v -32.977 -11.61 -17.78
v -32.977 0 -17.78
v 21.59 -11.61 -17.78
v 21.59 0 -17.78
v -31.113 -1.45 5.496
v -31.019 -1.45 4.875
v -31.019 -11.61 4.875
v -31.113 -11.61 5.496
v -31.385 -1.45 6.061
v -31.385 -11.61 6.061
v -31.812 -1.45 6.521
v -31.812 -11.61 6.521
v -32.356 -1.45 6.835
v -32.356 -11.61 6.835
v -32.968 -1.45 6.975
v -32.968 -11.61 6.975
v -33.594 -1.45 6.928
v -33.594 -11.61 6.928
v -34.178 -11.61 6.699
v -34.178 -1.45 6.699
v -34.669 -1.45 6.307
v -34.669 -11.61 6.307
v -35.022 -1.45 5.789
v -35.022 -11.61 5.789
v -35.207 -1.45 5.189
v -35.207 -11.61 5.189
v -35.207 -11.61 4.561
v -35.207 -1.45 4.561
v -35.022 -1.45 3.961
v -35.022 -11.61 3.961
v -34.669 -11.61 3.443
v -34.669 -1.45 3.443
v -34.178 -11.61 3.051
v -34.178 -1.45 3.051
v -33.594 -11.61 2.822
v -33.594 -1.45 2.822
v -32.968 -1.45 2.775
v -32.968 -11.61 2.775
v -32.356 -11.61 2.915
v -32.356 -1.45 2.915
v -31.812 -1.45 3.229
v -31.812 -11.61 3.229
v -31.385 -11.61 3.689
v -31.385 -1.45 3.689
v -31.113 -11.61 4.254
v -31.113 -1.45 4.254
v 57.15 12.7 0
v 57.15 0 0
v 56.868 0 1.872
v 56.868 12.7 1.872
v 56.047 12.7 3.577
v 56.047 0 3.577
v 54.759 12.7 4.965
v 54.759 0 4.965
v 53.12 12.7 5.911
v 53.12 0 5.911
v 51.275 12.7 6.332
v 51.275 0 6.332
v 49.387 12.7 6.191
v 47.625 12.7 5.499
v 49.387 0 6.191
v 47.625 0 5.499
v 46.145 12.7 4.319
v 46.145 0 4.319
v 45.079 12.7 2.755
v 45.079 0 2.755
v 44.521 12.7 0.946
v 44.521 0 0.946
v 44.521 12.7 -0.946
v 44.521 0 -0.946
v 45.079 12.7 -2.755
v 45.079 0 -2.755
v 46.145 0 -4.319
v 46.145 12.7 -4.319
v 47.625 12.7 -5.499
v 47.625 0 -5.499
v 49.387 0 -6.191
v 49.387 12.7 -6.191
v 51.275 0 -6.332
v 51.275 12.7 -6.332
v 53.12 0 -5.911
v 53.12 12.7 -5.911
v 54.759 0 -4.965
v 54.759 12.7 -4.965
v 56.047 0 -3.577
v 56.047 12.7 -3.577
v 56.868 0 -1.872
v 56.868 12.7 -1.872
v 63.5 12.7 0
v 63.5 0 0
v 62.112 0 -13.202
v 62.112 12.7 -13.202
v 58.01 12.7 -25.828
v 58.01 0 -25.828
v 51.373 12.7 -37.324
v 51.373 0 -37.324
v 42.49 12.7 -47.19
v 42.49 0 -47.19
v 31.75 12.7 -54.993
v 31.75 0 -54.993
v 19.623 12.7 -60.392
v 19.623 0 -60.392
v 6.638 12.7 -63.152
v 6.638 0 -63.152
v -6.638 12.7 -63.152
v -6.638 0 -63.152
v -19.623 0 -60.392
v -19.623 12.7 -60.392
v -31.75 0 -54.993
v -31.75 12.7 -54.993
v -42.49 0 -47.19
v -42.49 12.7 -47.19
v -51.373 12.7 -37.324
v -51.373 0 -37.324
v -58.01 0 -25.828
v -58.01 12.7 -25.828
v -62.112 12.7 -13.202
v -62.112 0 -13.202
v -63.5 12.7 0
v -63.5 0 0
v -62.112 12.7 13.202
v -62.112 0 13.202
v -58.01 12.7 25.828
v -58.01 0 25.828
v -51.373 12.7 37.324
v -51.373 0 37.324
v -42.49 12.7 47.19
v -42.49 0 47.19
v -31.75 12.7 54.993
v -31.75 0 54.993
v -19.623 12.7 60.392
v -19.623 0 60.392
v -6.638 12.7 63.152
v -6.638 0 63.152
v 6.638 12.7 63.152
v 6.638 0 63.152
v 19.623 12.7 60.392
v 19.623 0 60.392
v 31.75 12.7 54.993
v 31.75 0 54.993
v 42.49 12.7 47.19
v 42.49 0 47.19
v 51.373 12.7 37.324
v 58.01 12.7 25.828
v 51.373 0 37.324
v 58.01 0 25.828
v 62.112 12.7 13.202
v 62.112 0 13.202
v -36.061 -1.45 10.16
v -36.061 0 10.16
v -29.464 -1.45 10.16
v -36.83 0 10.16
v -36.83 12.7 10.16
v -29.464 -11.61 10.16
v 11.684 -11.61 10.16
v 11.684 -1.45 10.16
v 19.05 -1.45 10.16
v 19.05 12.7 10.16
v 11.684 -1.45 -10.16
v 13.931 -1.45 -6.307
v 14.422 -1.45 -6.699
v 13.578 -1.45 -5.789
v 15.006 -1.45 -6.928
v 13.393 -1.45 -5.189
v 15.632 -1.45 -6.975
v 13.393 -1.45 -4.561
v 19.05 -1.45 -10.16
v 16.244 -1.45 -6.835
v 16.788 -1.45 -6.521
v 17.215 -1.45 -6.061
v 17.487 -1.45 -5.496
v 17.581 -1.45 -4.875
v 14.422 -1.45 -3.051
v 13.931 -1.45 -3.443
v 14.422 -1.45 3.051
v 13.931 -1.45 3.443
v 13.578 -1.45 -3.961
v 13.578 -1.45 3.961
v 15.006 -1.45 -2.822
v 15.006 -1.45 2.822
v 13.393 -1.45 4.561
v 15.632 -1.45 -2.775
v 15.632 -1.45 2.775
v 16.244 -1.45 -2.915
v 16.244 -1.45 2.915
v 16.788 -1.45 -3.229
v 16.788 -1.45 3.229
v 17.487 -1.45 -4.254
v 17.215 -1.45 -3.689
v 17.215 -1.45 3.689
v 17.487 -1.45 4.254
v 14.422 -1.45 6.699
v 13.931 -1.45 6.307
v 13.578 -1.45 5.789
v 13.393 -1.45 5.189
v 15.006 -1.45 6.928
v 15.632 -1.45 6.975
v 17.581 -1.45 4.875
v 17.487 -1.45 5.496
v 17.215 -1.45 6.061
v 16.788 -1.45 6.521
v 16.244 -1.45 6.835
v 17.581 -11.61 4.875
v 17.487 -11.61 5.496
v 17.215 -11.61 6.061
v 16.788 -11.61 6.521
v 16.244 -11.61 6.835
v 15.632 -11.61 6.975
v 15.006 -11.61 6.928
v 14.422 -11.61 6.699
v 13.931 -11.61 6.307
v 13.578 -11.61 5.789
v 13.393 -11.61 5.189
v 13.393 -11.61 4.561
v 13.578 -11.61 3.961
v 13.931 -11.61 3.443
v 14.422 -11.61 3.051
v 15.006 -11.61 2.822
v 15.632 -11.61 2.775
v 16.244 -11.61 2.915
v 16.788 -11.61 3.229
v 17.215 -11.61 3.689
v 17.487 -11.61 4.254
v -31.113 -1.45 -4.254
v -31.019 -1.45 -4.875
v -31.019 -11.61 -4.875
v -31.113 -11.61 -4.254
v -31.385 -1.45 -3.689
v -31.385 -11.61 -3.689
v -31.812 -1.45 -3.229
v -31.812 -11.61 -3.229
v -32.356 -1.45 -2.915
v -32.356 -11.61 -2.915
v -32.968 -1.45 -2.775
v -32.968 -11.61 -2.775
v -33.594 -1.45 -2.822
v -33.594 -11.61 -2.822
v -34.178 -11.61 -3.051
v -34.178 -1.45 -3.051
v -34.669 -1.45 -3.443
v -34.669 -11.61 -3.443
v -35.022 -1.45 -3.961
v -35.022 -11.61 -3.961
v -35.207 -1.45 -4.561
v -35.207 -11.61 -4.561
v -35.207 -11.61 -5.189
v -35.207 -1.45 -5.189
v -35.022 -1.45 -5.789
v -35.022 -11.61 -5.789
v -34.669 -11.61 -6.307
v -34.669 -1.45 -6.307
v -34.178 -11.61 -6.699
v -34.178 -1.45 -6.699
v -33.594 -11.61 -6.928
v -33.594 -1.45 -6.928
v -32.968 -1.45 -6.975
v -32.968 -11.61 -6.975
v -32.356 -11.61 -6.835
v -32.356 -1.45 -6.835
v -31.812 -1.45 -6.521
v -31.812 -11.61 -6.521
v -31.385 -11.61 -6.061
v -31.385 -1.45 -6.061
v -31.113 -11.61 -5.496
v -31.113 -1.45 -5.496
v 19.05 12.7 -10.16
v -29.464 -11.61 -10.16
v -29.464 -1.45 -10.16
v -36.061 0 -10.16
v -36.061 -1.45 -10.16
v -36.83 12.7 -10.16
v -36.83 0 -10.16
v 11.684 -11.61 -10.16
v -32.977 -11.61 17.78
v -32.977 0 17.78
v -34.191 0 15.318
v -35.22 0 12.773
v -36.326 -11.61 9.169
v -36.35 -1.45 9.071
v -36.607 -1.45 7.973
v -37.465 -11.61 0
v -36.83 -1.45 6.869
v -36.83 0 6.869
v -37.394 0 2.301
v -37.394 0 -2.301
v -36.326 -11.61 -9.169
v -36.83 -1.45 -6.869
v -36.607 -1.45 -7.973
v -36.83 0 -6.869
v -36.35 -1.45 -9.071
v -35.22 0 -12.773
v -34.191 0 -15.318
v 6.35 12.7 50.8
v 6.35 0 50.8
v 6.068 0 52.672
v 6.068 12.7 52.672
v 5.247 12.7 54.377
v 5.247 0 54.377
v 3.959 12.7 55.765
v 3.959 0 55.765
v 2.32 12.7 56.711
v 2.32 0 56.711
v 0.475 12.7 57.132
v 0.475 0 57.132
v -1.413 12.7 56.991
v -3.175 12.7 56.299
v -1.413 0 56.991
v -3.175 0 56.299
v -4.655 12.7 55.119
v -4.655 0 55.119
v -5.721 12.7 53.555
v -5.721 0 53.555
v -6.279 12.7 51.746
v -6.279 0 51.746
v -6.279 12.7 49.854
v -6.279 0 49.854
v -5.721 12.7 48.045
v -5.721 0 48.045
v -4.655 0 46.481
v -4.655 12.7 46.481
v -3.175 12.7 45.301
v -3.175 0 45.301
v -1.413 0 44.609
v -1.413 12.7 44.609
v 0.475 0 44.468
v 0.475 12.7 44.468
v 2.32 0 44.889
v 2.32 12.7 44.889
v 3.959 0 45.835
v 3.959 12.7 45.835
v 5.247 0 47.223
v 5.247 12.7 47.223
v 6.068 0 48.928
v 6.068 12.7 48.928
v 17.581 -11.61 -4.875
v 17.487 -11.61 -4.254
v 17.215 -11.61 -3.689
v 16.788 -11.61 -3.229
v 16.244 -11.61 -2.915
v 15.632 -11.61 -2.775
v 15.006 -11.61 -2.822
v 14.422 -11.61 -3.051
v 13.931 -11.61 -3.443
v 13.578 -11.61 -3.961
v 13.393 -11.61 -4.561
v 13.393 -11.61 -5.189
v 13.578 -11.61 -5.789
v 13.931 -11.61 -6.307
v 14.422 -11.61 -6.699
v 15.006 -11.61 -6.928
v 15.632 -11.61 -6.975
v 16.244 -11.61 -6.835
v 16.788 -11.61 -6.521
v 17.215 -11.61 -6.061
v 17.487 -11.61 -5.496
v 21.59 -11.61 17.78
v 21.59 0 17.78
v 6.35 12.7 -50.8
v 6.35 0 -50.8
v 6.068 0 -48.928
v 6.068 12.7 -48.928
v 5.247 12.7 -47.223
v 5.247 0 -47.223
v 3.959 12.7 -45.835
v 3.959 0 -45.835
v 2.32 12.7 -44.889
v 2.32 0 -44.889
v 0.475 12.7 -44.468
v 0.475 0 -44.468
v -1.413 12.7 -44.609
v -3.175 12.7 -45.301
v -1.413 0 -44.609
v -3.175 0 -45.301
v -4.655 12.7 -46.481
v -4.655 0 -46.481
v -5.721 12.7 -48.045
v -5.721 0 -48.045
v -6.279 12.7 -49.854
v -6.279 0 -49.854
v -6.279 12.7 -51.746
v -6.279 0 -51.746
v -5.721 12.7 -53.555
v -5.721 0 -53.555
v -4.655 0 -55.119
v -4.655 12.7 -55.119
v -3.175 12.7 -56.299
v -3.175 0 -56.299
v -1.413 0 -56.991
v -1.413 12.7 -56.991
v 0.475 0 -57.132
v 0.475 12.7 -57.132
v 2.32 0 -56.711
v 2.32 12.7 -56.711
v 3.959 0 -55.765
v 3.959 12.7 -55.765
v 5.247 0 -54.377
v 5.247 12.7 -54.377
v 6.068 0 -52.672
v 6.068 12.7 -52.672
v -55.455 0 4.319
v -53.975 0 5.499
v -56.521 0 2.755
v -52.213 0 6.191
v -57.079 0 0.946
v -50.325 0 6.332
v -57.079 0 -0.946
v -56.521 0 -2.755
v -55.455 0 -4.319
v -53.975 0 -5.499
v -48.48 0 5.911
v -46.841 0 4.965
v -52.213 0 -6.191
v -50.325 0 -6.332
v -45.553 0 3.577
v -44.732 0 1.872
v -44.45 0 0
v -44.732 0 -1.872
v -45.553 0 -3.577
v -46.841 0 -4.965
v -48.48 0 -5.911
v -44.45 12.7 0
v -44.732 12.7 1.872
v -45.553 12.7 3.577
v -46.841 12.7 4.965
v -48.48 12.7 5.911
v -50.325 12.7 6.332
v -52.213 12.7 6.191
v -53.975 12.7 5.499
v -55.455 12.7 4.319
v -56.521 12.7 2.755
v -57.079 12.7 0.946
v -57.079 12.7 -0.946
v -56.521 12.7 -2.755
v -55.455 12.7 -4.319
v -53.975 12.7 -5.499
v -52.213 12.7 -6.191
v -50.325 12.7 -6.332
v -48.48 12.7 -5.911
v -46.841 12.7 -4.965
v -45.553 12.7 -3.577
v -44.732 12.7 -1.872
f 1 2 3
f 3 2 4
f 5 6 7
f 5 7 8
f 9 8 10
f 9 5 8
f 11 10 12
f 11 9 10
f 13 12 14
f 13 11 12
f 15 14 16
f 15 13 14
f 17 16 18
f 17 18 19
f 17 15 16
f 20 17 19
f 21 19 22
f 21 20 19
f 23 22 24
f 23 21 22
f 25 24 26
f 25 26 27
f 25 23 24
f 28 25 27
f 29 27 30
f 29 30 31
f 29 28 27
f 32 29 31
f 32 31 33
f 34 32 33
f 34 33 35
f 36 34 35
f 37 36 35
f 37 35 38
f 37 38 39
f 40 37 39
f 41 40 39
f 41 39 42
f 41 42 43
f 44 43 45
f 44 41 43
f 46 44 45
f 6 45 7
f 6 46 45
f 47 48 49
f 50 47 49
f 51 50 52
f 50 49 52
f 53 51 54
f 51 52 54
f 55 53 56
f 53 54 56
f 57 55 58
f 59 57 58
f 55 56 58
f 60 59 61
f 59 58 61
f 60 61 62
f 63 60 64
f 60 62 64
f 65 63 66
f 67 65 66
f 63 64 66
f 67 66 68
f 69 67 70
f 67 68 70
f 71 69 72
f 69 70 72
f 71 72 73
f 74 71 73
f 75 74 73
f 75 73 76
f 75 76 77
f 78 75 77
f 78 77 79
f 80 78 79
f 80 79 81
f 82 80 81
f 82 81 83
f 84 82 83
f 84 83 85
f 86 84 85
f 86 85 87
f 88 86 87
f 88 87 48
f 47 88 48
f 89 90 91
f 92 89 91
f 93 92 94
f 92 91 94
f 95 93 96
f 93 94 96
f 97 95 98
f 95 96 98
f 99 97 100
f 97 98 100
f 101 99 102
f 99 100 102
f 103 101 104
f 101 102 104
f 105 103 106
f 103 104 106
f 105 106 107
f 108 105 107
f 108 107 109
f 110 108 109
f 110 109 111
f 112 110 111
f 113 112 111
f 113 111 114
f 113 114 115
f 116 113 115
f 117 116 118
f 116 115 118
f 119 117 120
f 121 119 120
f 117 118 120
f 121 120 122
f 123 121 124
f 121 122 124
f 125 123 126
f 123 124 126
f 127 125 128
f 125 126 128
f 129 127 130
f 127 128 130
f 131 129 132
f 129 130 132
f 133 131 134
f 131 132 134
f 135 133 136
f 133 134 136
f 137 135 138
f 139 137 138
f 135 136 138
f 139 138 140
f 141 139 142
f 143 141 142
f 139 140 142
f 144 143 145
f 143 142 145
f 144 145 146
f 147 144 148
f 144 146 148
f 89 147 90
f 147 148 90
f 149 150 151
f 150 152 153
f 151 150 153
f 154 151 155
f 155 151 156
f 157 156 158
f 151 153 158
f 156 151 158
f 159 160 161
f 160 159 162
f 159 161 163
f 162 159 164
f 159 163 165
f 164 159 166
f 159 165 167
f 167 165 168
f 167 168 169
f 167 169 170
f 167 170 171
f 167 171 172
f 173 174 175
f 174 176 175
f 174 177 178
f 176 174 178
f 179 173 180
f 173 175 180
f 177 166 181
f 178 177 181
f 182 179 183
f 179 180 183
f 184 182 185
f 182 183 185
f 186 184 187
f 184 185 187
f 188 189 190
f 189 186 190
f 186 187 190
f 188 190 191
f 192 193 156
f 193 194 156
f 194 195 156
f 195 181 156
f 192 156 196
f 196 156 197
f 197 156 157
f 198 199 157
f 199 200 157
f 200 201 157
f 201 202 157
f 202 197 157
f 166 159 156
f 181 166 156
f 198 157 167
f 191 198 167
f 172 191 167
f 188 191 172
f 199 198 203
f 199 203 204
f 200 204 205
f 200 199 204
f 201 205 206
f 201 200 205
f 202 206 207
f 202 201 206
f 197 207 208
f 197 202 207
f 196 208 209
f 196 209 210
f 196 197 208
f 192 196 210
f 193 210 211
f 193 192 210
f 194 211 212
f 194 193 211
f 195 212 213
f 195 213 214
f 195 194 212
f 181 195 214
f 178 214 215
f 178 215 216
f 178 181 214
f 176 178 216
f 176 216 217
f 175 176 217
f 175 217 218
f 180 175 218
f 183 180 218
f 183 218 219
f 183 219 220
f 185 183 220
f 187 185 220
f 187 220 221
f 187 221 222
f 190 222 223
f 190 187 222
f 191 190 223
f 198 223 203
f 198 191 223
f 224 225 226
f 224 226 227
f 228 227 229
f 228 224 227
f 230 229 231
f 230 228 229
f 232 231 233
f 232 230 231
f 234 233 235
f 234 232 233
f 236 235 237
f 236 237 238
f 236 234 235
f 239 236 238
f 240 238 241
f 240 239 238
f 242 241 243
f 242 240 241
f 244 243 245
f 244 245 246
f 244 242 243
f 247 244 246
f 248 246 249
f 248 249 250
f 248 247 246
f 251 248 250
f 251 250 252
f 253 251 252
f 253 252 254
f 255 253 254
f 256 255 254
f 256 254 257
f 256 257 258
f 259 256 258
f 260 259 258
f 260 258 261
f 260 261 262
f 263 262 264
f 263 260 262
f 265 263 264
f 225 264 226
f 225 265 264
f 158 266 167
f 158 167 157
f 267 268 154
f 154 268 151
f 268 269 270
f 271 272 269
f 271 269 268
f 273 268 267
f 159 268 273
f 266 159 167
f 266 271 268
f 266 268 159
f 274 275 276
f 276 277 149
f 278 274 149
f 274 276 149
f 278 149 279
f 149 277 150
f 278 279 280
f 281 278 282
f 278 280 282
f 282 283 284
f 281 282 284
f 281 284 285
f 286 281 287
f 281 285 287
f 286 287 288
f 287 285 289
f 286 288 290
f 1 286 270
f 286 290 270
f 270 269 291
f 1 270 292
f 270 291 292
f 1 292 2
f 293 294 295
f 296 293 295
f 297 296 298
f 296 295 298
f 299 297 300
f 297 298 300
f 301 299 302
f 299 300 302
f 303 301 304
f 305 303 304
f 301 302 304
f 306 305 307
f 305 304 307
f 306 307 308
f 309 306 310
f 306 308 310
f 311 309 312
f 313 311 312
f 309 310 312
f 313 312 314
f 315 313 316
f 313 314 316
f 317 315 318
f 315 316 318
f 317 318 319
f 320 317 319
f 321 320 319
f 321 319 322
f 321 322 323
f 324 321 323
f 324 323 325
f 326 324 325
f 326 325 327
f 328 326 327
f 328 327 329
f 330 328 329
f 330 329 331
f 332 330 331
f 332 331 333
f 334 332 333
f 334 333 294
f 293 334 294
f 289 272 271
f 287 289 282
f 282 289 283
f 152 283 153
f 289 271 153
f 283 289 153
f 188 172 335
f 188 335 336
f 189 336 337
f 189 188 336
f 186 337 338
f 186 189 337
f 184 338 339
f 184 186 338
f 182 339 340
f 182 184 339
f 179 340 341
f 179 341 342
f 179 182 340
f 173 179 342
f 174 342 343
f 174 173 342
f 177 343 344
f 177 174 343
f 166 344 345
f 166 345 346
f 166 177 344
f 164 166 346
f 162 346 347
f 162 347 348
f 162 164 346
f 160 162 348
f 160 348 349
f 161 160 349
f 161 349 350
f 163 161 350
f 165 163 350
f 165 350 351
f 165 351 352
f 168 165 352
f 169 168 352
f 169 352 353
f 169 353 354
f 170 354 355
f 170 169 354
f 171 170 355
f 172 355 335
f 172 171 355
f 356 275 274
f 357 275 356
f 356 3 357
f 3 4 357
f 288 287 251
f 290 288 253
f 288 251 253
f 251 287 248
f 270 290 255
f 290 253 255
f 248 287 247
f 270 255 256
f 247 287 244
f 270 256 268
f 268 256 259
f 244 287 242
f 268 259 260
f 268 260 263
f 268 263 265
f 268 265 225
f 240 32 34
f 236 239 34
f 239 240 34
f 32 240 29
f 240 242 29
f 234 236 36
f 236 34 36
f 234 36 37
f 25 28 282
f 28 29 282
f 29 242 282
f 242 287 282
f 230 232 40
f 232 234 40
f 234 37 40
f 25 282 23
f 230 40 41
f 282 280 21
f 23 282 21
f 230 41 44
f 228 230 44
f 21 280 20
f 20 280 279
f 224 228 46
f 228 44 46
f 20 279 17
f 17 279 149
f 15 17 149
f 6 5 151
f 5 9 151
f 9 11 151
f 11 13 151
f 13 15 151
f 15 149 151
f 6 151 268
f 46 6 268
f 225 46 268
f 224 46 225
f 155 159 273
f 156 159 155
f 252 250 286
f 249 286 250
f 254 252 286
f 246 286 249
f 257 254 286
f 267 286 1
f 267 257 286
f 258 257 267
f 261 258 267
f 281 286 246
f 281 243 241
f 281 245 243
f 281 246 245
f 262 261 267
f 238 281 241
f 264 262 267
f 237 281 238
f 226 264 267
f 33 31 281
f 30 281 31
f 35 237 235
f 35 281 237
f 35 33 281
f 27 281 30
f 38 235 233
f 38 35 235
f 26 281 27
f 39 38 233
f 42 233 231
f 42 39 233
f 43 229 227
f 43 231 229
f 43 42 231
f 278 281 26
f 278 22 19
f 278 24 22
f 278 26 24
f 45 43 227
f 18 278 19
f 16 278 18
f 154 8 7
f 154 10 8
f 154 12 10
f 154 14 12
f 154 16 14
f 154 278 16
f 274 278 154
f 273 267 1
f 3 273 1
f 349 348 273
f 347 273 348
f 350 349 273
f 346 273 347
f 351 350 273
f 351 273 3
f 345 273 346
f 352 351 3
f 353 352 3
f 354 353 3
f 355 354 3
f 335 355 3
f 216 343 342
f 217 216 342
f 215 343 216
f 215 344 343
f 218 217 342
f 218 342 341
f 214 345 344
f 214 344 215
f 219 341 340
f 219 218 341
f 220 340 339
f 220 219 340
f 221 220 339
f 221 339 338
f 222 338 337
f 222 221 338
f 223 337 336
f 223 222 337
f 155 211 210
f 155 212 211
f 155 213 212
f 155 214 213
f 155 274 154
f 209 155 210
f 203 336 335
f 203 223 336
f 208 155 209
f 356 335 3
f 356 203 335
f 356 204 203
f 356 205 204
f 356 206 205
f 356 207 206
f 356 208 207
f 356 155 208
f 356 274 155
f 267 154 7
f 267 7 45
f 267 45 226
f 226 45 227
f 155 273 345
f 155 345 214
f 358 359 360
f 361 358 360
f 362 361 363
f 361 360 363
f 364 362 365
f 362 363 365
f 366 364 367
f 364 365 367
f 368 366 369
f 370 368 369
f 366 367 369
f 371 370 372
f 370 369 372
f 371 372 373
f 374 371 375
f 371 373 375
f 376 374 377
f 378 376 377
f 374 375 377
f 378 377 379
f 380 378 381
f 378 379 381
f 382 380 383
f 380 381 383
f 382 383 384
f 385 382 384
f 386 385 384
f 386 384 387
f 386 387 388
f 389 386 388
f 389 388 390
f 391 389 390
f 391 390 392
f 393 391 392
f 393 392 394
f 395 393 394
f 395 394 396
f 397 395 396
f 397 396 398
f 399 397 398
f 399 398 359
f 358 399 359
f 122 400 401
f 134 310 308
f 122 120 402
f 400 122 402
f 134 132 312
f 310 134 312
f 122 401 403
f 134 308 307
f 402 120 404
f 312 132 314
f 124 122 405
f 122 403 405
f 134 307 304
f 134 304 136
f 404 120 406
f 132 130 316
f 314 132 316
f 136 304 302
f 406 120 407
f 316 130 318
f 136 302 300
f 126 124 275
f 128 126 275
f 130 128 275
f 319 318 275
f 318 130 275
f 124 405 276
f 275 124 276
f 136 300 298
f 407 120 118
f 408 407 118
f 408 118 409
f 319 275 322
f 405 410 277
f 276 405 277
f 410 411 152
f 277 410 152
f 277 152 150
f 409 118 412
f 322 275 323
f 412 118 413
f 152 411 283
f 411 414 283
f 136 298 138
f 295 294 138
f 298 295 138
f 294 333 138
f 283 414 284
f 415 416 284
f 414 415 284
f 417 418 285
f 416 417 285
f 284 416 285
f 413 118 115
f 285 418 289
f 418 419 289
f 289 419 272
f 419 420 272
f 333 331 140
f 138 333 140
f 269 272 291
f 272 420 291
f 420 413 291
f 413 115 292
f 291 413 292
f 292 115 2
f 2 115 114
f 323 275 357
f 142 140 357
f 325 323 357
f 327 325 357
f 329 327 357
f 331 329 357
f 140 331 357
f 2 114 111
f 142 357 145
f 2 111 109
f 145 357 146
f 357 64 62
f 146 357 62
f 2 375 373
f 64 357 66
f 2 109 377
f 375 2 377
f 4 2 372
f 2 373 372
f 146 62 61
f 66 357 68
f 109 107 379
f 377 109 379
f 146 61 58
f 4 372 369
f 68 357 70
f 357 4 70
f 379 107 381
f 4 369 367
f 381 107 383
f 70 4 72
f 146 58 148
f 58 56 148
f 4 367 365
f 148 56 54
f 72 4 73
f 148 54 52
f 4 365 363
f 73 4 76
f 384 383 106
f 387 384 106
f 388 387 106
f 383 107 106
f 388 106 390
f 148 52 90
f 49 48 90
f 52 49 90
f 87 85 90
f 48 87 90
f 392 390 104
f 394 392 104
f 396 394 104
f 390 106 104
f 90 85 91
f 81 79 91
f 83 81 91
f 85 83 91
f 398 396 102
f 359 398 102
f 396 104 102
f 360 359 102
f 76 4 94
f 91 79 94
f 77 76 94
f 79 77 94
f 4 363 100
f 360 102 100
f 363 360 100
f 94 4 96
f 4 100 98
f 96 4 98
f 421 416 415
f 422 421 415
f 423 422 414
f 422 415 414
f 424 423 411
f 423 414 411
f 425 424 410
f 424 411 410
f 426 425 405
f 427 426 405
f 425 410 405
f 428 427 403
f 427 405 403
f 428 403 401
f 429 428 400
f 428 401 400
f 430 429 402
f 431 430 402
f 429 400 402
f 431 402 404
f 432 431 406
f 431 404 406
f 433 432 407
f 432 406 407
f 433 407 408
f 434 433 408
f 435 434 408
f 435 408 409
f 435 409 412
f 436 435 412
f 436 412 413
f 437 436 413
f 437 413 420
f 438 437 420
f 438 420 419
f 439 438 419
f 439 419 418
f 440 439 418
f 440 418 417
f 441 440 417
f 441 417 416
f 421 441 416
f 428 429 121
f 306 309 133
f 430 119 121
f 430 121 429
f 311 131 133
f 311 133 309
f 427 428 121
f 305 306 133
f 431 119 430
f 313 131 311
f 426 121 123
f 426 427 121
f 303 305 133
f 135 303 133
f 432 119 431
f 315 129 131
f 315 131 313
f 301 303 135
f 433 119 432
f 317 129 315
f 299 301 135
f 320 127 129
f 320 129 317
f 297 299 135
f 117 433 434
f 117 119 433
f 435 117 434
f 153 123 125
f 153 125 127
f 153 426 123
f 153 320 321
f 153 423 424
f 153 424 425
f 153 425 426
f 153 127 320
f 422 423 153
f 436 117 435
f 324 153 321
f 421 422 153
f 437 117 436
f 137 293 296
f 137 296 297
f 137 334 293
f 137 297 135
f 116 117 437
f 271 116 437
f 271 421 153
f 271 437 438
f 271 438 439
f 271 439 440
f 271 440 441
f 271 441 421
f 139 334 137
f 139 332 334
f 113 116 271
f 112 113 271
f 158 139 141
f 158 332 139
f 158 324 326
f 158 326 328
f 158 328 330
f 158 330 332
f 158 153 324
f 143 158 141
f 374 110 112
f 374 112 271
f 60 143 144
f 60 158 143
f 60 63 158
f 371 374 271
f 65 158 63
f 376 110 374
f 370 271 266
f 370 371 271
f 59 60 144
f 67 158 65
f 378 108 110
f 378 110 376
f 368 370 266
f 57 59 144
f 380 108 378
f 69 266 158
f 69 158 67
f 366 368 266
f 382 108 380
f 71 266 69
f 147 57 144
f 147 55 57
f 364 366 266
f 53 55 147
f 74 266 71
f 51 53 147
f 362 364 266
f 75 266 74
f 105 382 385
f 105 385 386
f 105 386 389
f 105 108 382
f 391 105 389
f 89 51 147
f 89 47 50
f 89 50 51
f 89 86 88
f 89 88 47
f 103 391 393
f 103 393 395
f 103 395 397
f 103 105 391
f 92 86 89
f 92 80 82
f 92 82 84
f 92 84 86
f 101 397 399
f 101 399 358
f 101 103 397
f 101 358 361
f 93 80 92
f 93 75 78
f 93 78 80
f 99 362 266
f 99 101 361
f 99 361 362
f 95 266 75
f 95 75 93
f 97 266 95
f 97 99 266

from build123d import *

# Parameters (mm, degrees)
SKETCH2_R           = 63.5
BOSS_EXTRUDE1_DEPTH = 12.7
SKETCH3_R           = 6.35
CUT_EXTRUDE1_DEPTH  = 13.7
SKETCH6_W           = 55.88
SKETCH6_H           = 20.32
CUT_EXTRUDE3_DEPTH  = 27.686
SKETCH8_W           = 60.96
SKETCH8_H           = 35.56
SKETCH8_W_2         = 55.88
SKETCH8_H_2         = 20.32
BOSS_EXTRUDE2_DEPTH = 1.45
SKETCH9_W           = 60.96
SKETCH9_H           = 35.56
SKETCH9_R           = 2.105780523
SKETCH9_W_2         = 41.148
SKETCH9_H_2         = 20.32
BOSS_EXTRUDE3_DEPTH = 10.16
SKETCH11_R          = 63.5
SKETCH11_R_2        = 37.465
CUT_EXTRUDE5_DEPTH  = 12.61


with BuildPart() as part:
    # Sketch2 → Boss-Extrude1 (new body)
    with BuildSketch(Plane(origin=(0, 0, 0), x_dir=(1, 0, 0), z_dir=(0, 1, 0))):
        Circle(SKETCH2_R)
    extrude(amount=BOSS_EXTRUDE1_DEPTH)

    # Sketch3 → Cut-Extrude1 (cut, through all)
    with BuildSketch(Plane.XZ):
        with Locations((0, 50.8)):
            Circle(SKETCH3_R)
        with Locations((-50.8, 0)):
            Circle(SKETCH3_R)
        with Locations((0, -50.8)):
            Circle(SKETCH3_R)
        with Locations((50.8, 0)):
            Circle(SKETCH3_R)
    extrude(amount=-CUT_EXTRUDE1_DEPTH, mode=Mode.SUBTRACT)

    # Sketch6 → Cut-Extrude3 (cut)
    with BuildSketch(Plane.XZ):
        with Locations((-8.89, 0)):
            Rectangle(SKETCH6_W, SKETCH6_H)
    extrude(amount=-CUT_EXTRUDE3_DEPTH, mode=Mode.SUBTRACT)

    # Sketch8 → Boss-Extrude2 (add)
    with BuildSketch(Plane.XZ):
        with Locations((-8.89, 0)):
            Rectangle(SKETCH8_W, SKETCH8_H)
        with Locations((-8.89, 0)):
            Rectangle(SKETCH8_W_2, SKETCH8_H_2, mode=Mode.SUBTRACT)
    extrude(amount=BOSS_EXTRUDE2_DEPTH)

    # Sketch9 → Boss-Extrude3 (add)
    with BuildSketch(Plane.XZ.offset(1.45)):
        with Locations((-8.89, 0)):
            Rectangle(SKETCH9_W, SKETCH9_H)
        with Locations((-33.125, 4.875)):
            Circle(SKETCH9_R, mode=Mode.SUBTRACT)
        with Locations((-33.125, -4.875)):
            Circle(SKETCH9_R, mode=Mode.SUBTRACT)
        with Locations((15.475, 4.875)):
            Circle(SKETCH9_R, mode=Mode.SUBTRACT)
        with Locations((15.475, -4.875)):
            Circle(SKETCH9_R, mode=Mode.SUBTRACT)
        with Locations((-8.89, 0)):
            Rectangle(SKETCH9_W_2, SKETCH9_H_2, mode=Mode.SUBTRACT)
    extrude(amount=BOSS_EXTRUDE3_DEPTH)

    # Sketch11 → Cut-Extrude5 (cut, through all)
    with BuildSketch(Plane.XZ):
        Circle(SKETCH11_R)
        Circle(SKETCH11_R_2, mode=Mode.SUBTRACT)
    extrude(amount=CUT_EXTRUDE5_DEPTH, mode=Mode.SUBTRACT)


solid = part.part
